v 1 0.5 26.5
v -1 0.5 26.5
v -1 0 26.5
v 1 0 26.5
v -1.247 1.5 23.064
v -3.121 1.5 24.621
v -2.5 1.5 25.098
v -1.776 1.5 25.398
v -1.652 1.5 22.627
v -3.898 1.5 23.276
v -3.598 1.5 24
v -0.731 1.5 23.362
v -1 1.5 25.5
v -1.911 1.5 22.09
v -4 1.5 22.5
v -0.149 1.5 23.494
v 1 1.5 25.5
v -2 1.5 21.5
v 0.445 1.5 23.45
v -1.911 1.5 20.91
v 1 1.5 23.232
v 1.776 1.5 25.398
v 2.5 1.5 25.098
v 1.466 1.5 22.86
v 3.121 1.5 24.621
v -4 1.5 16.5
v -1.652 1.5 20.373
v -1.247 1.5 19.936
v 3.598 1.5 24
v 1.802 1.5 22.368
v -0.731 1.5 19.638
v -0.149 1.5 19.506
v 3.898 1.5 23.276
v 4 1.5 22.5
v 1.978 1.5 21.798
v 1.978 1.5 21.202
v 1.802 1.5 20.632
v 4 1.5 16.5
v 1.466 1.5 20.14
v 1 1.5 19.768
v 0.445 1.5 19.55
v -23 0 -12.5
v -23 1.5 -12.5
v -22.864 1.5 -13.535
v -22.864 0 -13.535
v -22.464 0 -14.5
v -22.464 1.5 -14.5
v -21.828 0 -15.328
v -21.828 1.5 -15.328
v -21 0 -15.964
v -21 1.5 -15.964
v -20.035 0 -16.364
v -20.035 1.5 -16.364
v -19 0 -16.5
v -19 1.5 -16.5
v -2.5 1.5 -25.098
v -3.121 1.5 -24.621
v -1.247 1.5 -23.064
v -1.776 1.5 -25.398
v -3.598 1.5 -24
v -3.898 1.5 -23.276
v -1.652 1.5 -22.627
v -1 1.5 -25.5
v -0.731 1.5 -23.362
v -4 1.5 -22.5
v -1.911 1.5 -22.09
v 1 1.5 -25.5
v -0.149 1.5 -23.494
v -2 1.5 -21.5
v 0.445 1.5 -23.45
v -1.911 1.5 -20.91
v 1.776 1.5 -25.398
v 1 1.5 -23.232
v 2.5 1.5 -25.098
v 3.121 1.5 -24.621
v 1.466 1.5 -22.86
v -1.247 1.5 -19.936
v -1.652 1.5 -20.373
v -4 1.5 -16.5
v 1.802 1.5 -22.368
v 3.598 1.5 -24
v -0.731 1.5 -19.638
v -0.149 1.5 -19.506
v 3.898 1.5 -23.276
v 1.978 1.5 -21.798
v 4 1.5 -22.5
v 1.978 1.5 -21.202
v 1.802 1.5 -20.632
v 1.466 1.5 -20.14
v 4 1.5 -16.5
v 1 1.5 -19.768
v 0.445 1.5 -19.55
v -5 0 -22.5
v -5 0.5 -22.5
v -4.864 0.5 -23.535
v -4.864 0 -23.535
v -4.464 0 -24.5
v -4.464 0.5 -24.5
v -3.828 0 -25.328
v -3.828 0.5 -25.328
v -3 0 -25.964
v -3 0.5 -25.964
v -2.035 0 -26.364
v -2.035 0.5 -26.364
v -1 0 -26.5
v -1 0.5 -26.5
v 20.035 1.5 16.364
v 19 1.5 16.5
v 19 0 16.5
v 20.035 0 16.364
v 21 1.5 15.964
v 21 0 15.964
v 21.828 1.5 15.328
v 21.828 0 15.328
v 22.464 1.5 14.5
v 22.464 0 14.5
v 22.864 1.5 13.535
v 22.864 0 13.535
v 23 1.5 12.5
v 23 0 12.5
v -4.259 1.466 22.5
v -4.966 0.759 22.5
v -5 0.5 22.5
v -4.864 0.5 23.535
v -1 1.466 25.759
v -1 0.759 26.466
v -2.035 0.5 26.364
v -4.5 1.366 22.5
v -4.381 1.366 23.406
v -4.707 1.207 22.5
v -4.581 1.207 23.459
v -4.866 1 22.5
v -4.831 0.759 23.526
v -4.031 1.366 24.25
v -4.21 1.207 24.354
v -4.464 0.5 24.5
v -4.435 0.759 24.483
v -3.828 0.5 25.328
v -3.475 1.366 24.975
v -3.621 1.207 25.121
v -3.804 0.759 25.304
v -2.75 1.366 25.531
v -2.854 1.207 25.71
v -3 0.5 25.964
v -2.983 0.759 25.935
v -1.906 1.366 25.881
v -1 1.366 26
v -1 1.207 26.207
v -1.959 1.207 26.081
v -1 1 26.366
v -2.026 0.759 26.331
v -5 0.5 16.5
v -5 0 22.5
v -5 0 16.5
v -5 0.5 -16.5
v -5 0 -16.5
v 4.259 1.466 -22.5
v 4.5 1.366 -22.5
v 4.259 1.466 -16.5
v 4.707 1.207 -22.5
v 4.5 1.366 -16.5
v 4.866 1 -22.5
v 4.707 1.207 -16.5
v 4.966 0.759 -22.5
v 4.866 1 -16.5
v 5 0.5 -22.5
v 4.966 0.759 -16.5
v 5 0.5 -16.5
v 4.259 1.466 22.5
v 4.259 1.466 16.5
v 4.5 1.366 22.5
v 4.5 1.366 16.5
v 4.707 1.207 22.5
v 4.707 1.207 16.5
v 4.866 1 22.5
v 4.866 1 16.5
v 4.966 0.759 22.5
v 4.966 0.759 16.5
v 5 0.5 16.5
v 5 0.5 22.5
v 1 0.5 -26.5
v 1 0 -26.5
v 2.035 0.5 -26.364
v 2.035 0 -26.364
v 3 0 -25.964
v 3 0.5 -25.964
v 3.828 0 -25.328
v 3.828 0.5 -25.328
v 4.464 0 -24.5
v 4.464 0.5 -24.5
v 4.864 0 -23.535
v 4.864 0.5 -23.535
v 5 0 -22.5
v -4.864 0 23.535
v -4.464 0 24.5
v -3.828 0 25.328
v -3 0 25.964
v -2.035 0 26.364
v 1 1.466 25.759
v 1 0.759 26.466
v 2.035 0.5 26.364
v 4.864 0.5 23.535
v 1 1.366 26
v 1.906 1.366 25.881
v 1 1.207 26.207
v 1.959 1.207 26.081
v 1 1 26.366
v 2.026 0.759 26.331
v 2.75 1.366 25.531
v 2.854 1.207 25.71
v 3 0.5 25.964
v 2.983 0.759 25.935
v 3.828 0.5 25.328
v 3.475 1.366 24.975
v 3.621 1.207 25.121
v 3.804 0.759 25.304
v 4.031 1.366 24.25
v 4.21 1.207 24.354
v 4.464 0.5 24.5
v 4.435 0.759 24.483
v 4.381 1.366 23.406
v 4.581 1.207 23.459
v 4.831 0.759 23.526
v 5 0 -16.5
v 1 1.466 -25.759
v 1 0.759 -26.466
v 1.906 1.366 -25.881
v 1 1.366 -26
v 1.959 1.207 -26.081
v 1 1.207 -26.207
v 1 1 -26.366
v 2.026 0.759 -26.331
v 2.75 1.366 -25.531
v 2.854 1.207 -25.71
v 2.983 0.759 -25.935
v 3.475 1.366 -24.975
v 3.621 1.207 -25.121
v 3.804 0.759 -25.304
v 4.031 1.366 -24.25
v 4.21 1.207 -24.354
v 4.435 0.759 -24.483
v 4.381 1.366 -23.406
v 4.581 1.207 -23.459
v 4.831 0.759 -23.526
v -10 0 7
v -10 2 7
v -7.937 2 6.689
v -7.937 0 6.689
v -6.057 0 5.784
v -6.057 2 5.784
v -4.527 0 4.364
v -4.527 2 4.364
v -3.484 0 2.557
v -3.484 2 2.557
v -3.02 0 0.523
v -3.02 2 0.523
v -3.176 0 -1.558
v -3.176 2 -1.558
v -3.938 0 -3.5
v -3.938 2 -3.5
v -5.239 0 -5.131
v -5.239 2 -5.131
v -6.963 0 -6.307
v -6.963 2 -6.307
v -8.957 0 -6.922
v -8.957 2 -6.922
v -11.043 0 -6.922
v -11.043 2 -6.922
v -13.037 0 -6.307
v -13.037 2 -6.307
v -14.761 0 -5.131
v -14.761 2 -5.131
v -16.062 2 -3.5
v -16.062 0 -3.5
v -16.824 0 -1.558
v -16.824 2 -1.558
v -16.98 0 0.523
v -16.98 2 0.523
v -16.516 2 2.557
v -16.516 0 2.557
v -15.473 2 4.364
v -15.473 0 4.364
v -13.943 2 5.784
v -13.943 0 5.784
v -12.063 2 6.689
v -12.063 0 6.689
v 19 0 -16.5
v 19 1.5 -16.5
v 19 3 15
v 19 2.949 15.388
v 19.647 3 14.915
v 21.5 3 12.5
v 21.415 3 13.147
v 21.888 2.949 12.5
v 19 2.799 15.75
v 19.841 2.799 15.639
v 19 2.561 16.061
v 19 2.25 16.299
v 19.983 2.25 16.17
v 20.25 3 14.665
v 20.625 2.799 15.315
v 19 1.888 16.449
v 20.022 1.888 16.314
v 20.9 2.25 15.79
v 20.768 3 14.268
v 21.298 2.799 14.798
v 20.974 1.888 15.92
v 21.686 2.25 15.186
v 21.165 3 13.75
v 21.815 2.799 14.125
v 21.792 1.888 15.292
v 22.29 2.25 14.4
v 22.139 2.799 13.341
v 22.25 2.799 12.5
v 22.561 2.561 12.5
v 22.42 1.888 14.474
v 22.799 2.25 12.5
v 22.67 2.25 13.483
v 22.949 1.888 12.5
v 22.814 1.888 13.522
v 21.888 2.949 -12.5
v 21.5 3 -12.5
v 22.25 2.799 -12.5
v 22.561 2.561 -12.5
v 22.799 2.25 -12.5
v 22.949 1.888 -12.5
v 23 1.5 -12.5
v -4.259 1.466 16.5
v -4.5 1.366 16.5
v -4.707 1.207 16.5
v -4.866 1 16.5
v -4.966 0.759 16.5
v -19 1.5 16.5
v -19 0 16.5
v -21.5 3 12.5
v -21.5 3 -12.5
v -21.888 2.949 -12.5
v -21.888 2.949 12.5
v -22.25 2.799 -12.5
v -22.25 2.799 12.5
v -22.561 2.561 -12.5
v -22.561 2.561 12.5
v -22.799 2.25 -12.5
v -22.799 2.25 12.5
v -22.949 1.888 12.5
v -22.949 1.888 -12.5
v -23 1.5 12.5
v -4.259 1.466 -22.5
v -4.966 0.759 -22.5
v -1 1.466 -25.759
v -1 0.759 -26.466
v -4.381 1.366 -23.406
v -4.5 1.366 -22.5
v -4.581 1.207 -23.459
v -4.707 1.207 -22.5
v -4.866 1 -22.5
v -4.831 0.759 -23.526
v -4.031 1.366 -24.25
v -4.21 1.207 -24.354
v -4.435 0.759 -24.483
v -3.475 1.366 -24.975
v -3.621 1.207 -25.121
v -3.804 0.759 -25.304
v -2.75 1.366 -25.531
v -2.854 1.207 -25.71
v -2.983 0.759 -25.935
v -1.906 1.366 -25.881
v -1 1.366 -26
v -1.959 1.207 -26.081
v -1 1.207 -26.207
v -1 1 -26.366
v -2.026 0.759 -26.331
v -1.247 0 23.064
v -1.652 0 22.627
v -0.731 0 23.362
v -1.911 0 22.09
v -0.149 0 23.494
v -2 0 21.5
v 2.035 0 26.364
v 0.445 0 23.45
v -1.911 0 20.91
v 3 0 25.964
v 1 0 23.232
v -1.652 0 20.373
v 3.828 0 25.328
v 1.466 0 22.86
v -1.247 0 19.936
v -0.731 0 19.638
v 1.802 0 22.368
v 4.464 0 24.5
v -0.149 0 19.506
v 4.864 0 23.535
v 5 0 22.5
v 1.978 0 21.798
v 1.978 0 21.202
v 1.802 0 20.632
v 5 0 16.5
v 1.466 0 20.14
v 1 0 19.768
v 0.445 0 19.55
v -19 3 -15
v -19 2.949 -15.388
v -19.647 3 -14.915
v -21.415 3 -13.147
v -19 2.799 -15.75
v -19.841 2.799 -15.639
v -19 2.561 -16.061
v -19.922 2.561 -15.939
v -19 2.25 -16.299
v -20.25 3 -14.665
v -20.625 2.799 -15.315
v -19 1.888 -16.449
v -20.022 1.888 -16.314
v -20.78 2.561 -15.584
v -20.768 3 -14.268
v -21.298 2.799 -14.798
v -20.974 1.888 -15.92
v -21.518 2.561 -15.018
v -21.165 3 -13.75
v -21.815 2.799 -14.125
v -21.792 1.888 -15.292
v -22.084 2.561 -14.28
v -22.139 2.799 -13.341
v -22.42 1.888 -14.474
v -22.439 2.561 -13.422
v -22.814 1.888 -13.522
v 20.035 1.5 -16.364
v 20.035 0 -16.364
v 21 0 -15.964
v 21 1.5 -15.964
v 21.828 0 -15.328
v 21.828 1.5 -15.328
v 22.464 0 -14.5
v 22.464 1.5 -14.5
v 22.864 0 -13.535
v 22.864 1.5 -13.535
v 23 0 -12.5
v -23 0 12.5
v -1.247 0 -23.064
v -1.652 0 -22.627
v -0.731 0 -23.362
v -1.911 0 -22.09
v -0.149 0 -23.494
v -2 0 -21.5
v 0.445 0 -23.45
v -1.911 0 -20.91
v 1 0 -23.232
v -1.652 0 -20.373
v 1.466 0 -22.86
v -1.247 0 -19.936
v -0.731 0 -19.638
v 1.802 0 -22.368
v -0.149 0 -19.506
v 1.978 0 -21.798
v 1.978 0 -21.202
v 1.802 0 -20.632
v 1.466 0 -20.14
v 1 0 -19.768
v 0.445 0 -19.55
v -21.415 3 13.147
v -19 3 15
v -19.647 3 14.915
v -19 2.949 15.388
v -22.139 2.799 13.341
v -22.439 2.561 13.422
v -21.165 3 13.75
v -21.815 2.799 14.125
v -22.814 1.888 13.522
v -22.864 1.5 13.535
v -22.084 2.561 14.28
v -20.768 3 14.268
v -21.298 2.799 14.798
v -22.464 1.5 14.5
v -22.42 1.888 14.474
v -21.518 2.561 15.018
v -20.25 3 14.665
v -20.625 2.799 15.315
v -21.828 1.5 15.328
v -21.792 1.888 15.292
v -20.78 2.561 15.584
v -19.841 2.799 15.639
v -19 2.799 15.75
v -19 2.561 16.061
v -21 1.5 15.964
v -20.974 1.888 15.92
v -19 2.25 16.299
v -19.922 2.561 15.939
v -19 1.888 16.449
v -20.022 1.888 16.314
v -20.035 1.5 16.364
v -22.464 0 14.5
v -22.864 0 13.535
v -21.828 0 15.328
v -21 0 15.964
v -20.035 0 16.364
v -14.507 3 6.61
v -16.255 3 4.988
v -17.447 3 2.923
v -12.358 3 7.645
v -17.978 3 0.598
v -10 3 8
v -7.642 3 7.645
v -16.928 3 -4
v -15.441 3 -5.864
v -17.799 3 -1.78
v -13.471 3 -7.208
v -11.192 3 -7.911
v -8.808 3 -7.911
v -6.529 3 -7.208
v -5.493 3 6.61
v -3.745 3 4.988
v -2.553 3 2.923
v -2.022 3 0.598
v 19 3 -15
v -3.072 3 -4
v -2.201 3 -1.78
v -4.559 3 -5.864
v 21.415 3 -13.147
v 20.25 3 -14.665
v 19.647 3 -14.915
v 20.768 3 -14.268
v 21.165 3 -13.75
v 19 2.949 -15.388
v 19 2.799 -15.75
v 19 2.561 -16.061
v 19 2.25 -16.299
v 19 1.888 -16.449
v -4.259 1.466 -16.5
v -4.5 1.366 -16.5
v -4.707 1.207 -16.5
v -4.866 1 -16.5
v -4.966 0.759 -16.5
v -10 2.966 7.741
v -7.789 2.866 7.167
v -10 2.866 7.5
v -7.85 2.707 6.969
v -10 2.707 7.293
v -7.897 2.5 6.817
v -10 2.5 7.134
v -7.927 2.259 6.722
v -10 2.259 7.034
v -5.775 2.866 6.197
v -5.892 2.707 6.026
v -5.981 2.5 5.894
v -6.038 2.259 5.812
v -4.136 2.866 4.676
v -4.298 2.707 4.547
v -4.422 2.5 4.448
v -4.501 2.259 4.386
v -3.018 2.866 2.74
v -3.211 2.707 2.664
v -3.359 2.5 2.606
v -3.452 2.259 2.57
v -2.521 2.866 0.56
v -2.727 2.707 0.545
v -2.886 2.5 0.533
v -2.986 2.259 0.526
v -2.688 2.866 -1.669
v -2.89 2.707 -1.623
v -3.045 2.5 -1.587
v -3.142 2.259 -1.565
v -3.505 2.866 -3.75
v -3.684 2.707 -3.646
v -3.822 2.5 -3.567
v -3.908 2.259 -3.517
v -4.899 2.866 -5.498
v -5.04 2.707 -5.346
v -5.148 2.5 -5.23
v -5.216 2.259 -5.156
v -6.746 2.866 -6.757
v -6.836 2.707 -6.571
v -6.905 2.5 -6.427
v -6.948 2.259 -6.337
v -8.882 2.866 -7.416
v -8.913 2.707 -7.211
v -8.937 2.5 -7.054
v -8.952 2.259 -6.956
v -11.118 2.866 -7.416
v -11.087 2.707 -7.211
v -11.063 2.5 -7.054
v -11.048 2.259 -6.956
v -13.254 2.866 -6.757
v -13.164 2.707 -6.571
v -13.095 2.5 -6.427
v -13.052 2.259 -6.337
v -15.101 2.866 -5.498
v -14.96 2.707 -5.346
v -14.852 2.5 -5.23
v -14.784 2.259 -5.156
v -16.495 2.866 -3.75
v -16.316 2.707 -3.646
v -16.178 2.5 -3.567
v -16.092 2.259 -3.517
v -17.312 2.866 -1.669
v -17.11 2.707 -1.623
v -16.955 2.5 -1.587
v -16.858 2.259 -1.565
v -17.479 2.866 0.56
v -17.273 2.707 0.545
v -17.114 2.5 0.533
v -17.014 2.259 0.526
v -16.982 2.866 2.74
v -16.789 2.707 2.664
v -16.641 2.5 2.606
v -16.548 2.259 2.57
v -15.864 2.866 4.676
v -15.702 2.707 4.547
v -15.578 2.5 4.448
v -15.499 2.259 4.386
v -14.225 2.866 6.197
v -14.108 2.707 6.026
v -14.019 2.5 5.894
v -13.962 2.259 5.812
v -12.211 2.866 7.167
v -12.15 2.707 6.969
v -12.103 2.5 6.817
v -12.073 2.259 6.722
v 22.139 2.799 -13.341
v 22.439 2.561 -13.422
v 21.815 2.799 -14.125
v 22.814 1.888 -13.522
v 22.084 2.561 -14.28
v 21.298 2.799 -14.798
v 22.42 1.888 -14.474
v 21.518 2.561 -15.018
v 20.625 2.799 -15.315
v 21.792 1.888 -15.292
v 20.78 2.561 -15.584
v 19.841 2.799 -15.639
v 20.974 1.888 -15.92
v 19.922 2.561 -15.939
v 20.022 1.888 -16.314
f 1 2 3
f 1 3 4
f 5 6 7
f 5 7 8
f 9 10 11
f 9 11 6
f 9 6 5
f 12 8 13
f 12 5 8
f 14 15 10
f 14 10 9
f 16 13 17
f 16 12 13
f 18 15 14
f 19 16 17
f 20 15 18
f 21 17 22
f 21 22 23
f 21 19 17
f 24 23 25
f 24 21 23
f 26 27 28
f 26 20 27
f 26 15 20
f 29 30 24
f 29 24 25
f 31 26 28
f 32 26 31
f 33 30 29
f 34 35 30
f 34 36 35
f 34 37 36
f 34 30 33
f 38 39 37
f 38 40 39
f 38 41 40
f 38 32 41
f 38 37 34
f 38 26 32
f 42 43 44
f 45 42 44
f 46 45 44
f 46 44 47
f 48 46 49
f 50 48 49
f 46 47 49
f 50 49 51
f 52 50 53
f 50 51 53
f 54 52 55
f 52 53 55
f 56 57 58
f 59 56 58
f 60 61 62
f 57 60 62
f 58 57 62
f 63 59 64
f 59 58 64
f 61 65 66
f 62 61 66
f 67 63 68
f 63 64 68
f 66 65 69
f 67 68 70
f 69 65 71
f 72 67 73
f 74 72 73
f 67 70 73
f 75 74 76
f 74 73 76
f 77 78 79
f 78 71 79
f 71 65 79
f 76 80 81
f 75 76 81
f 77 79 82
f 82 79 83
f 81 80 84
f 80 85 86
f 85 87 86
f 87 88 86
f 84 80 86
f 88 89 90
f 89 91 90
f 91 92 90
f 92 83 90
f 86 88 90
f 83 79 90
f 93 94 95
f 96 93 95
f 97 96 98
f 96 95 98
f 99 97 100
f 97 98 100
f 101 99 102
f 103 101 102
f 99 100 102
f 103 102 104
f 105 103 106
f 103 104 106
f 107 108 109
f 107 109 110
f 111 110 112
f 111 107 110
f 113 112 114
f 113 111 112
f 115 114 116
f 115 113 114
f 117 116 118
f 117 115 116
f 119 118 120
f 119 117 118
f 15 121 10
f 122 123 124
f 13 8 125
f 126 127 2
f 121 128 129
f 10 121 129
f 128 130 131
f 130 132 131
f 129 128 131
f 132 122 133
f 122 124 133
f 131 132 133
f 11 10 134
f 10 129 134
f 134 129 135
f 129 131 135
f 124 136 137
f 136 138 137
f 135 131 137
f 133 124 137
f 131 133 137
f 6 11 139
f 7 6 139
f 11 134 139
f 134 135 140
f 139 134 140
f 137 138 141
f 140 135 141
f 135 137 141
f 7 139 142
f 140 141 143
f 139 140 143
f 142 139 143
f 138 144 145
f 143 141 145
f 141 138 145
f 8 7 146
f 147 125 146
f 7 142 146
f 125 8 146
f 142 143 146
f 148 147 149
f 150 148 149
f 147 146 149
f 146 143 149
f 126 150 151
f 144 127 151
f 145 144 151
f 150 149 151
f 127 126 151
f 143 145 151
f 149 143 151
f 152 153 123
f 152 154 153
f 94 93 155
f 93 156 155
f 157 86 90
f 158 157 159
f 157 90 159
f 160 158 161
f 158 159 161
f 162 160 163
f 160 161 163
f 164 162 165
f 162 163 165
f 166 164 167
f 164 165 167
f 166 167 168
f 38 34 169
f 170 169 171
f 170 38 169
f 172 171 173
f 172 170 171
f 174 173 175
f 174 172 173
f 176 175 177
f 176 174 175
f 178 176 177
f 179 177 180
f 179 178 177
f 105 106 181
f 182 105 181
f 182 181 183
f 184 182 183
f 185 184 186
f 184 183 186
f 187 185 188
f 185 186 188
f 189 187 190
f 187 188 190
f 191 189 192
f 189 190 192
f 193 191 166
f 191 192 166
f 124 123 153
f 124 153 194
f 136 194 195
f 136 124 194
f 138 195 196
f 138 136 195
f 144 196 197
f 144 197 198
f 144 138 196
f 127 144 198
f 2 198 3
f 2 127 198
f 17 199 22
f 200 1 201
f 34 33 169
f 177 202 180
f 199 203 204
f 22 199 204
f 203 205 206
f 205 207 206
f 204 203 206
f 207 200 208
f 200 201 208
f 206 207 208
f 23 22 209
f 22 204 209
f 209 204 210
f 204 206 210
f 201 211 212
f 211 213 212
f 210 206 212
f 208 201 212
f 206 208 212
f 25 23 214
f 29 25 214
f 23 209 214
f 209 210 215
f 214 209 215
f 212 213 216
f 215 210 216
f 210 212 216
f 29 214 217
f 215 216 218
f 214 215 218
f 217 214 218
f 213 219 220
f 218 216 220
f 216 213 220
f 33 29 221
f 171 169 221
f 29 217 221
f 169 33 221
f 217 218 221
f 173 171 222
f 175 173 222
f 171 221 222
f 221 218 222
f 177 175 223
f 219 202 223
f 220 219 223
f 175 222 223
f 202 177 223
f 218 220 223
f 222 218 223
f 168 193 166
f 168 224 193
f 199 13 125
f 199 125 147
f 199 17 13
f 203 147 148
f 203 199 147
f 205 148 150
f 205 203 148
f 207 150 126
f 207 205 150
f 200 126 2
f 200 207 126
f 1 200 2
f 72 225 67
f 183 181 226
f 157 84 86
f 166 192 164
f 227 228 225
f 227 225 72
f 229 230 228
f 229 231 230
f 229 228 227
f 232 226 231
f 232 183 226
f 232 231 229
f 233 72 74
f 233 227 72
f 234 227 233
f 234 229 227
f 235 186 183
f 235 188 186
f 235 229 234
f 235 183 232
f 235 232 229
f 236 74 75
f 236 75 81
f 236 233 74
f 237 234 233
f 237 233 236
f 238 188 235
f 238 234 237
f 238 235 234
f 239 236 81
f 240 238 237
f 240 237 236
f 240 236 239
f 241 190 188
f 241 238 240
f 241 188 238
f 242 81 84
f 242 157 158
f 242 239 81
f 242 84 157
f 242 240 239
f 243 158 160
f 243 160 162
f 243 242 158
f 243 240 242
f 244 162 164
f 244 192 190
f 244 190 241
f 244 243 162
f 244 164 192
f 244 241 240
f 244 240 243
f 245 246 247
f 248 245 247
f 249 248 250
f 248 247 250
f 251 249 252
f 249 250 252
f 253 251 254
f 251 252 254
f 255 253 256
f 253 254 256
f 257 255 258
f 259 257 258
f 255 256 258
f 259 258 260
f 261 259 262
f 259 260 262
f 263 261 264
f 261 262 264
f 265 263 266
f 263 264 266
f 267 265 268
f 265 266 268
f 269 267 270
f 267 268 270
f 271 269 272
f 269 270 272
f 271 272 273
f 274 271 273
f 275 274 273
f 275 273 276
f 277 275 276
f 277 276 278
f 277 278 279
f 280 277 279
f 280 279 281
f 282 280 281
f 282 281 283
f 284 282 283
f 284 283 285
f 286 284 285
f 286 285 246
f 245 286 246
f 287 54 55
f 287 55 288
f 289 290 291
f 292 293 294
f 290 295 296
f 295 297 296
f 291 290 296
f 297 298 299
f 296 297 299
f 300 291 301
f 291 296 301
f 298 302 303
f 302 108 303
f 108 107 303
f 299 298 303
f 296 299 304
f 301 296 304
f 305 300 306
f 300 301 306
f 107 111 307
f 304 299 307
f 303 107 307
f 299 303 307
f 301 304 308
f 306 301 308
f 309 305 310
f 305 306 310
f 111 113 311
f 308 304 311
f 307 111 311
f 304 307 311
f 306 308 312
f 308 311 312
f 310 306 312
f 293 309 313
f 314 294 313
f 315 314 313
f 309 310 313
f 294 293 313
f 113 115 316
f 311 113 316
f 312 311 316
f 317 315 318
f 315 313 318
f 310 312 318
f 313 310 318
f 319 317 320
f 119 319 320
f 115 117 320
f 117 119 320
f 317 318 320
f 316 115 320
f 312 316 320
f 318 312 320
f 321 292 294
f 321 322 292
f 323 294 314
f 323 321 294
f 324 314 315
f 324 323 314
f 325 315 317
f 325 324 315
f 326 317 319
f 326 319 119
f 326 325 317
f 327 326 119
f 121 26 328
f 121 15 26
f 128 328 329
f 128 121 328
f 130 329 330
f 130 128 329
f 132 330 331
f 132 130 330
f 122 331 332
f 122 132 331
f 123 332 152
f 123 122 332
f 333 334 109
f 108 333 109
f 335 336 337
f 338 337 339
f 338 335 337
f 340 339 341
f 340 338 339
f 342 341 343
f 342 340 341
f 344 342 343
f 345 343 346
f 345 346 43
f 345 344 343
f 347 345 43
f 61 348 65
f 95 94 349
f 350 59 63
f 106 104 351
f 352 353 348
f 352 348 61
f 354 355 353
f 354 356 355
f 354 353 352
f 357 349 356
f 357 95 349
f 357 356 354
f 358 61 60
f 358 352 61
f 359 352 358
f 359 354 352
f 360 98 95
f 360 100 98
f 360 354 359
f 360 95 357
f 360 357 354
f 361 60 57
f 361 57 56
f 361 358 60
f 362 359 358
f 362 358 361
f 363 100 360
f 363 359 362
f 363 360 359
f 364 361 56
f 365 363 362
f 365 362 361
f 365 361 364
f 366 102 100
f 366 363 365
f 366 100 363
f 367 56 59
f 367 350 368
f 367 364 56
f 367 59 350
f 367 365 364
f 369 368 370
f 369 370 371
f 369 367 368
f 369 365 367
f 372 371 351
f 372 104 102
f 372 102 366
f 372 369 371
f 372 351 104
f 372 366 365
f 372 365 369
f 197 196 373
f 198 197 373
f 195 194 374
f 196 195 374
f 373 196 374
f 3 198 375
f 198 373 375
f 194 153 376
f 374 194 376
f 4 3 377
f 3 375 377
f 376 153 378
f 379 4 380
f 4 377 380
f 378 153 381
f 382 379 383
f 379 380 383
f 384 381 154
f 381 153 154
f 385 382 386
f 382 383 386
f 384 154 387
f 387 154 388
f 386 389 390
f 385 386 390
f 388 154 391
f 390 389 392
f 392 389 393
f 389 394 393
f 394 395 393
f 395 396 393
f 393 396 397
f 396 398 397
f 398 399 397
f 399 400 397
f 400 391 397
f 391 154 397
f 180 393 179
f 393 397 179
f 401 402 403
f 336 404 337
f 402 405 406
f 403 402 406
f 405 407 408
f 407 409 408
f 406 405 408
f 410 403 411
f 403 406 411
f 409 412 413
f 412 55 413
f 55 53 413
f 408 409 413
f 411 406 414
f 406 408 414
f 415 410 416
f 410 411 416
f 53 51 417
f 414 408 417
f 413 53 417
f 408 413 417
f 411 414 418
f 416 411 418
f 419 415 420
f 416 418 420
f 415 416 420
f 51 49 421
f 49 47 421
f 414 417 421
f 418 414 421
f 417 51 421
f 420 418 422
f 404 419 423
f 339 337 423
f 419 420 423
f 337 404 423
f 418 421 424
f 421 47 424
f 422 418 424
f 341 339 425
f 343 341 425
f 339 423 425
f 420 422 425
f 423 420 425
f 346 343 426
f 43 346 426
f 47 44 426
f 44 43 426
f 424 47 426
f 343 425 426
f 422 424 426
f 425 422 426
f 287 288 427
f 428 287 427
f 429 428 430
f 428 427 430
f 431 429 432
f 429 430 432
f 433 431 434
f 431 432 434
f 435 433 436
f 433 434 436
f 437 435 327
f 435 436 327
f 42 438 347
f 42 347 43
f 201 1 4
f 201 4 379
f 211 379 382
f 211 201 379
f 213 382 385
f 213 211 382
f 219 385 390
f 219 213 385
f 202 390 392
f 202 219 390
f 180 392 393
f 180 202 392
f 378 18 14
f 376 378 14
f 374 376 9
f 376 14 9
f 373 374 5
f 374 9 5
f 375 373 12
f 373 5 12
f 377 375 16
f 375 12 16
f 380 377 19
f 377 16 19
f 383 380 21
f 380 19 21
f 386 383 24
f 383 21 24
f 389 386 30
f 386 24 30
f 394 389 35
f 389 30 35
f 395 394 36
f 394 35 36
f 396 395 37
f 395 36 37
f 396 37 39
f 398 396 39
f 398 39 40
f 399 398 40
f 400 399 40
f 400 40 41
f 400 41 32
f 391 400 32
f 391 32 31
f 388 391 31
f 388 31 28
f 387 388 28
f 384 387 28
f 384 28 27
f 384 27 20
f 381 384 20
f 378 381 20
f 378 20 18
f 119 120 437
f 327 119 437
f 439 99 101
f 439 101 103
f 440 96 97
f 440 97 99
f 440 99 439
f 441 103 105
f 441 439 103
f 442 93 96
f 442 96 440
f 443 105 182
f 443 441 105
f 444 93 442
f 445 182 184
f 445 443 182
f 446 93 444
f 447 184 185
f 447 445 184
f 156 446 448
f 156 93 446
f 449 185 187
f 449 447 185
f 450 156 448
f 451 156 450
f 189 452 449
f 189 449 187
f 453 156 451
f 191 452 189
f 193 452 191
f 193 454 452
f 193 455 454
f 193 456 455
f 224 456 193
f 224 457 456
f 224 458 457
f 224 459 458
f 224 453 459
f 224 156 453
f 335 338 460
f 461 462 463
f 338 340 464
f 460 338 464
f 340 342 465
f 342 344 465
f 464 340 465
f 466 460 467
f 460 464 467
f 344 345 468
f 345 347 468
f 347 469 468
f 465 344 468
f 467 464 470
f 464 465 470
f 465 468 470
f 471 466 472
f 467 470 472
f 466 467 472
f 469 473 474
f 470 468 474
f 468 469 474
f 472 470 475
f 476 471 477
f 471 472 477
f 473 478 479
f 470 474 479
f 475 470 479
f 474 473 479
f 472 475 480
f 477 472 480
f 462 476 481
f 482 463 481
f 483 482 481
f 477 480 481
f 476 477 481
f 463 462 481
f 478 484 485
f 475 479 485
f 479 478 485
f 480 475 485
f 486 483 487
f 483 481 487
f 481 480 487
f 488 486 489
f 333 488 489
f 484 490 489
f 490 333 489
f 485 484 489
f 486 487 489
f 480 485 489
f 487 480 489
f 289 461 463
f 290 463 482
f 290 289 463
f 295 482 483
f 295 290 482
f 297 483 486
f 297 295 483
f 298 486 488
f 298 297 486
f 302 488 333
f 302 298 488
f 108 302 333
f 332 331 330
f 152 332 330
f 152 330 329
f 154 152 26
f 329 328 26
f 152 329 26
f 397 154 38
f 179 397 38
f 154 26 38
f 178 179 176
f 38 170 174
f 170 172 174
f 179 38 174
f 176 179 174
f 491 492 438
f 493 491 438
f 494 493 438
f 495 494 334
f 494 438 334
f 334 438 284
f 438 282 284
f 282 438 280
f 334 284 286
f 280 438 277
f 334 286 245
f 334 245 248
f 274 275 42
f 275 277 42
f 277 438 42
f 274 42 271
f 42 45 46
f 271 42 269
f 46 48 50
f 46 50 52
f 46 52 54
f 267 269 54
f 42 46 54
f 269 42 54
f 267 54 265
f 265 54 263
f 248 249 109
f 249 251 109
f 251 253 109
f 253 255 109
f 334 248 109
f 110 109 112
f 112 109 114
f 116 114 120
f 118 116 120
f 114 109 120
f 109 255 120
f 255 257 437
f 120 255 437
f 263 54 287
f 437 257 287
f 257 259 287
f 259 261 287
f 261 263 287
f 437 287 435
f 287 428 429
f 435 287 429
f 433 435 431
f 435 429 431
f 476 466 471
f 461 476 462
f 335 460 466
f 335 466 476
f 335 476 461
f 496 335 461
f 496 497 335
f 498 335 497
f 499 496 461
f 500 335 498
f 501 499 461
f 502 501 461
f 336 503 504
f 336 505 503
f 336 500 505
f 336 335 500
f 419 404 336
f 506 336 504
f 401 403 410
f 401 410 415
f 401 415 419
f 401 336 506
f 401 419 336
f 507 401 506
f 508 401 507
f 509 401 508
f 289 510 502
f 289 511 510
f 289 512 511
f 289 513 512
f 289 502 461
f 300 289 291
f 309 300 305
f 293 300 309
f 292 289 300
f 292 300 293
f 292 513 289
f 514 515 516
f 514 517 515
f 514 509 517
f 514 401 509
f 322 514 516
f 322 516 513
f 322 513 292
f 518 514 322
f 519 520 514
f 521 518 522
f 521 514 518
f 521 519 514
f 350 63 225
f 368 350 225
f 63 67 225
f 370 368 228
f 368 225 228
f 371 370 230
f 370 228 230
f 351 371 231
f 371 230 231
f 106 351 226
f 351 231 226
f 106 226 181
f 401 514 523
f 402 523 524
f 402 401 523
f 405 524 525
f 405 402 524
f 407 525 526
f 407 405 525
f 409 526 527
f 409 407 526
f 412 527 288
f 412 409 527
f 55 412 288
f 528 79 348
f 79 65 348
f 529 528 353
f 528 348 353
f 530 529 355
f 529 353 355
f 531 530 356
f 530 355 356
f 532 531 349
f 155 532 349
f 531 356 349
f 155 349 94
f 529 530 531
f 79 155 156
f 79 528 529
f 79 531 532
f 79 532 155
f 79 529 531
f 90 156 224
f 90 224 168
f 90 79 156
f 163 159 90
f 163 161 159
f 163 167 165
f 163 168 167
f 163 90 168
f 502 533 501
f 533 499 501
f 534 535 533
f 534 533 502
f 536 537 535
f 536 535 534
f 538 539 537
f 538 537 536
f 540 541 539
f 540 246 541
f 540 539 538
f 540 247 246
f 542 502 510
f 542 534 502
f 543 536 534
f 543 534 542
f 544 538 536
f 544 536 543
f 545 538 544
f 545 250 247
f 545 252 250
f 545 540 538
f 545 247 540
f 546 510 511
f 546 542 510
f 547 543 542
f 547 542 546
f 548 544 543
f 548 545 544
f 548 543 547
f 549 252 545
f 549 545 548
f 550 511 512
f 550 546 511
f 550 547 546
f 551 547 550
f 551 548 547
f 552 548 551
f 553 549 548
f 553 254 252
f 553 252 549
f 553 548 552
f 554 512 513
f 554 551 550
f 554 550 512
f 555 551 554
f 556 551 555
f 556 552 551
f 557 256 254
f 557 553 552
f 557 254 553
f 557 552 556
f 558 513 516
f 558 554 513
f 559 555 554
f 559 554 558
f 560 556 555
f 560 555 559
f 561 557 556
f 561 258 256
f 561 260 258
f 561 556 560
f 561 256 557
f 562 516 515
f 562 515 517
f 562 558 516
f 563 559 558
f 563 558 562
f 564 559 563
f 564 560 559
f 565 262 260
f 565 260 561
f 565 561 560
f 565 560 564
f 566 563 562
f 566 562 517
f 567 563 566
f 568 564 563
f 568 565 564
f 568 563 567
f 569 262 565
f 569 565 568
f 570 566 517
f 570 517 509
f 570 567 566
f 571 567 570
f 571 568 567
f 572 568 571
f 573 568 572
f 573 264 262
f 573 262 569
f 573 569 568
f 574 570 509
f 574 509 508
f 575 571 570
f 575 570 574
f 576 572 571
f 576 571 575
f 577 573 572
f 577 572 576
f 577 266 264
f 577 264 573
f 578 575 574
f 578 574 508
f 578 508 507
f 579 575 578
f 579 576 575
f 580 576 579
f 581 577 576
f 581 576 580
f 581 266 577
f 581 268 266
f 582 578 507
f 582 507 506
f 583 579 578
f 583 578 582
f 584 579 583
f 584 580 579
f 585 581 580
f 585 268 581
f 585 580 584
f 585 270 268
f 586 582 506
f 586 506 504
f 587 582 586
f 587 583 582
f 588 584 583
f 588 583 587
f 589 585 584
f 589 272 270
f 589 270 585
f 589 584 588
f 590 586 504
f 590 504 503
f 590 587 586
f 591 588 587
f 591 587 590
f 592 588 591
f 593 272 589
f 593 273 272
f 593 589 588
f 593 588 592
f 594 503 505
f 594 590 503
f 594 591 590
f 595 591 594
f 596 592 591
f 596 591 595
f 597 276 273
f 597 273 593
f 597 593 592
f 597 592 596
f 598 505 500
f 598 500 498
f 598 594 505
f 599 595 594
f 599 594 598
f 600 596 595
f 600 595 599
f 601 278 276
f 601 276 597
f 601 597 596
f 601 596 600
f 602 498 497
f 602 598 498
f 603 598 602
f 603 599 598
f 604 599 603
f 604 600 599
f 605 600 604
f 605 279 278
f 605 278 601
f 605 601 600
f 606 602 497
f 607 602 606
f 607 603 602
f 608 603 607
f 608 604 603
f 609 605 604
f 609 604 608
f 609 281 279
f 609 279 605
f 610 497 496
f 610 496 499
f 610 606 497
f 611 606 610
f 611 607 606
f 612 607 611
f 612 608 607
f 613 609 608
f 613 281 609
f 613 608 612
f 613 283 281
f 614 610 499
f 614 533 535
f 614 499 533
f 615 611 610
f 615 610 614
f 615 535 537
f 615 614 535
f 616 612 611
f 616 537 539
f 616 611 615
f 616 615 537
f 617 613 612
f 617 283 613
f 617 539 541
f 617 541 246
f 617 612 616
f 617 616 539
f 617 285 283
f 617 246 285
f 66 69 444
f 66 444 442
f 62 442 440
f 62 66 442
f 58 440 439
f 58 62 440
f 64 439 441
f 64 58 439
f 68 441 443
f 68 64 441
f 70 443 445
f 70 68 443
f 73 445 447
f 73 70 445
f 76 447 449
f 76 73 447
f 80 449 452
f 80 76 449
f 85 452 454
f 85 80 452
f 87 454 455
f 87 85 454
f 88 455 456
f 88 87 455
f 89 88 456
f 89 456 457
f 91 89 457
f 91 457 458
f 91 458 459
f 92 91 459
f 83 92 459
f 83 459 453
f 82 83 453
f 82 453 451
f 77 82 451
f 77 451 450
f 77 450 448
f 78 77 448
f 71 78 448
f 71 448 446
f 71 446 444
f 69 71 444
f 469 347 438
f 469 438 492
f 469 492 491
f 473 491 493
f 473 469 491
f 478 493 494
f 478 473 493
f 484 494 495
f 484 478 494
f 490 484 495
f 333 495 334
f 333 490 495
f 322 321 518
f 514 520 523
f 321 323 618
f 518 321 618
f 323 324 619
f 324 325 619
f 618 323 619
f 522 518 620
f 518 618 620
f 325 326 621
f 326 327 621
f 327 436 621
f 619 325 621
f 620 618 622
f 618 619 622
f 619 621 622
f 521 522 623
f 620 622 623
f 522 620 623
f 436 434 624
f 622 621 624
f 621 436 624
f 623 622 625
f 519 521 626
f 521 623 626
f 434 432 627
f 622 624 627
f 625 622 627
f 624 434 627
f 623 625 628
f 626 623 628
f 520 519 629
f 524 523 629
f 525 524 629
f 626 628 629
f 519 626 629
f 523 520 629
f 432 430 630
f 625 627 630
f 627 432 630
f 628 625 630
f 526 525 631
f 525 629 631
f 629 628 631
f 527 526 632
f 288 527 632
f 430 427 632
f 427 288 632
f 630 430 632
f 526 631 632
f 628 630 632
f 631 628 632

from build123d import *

# Parameters (mm, degrees)
BASE_W             = 46
BASE_H             = 33
SHELL_DEPTH        = 3
SKETCH2_W          = 10
SKETCH2_H          = 1.5
LEG_DEPTH          = 10
SKETCH3_R          = 2
CUT_EXTRUDE1_DEPTH = 10
FILLET1_R          = 4
SKETCH4_R          = 7
CUT_EXTRUDE2_DEPTH = 10
FILLET2_R          = 1
FILLET3_R          = 4
FILLET10_R         = 1.5
FILLET11_R         = 1
FILLET12_R         = 1


with BuildPart() as part:
    # Base → Shell (new body)
    with BuildSketch(Plane(origin=(0, 0, 0), x_dir=(1, 0, 0), z_dir=(0, 1, 0))):
        Rectangle(BASE_W, BASE_H)
    extrude(amount=SHELL_DEPTH)

    # Sketch4 → Cut-Extrude2 (cut)
    with BuildSketch(Plane(origin=(0, 3, 0), x_dir=(1, 0, 0), z_dir=(0, 1, 0))):
        with Locations(Location((-10, 0, 0), (0, 0, 270))):
            Circle(SKETCH4_R)
    extrude(amount=-CUT_EXTRUDE2_DEPTH, mode=Mode.SUBTRACT)

    # Fillet2
    fillet2_edges = [part.edges().sort_by_distance(p)[0] for p in [
        (-10, 3, -7),
    ]]
    fillet(fillet2_edges, radius=FILLET2_R)

    # Fillet3
    fillet3_edges = [part.edges().sort_by_distance(p)[0] for p in [
        (23, 1.5, 16.5),
        (-23, 1.5, 16.5),
        (-23, 1.5, -16.5),
        (23, 1.5, -16.5),
    ]]
    fillet(fillet3_edges, radius=FILLET3_R)

    # Fillet10
    fillet10_edges = [part.edges().sort_by_distance(p)[0] for p in [
        (23, 3, 0),
        (0, 3, 16.5),
        (0, 3, -16.5),
        (-23, 3, 0),
        (-21.828427125, 3, 15.328427125),
        (-21.828427125, 3, -15.328427125),
        (21.828427125, 3, -15.328427125),
        (21.828427125, 3, 15.328427125),
    ]]
    fillet(fillet10_edges, radius=FILLET10_R)


with BuildPart() as body_2:
    # Sketch2 → Leg (new body)
    with BuildSketch(Plane.XY.offset(16.5)):
        with Locations((0, 0.75)):
            Rectangle(SKETCH2_W, SKETCH2_H)
    extrude(amount=LEG_DEPTH)

    # Sketch3 → Cut-Extrude1 (cut)
    with BuildSketch(Plane(origin=(0, 3, 0), x_dir=(1, 0, 0), z_dir=(0, 1, 0))):
        with Locations(Location((0, -21.5, 0), (0, 0, 180))):
            Circle(SKETCH3_R)
    extrude(amount=-CUT_EXTRUDE1_DEPTH, mode=Mode.SUBTRACT)

    # Fillet1
    fillet1_edges = [body_2.edges().sort_by_distance(p)[0] for p in [
        (-5, 0.75, 26.5),
        (5, 0.75, 26.5),
    ]]
    fillet(fillet1_edges, radius=FILLET1_R)


with BuildPart() as body_3:
    # Mirror3: mirrored copy
    add(body_2.part.mirror(Plane.XY))

    # Fillet12
    fillet12_edges = [body_3.edges().sort_by_distance(p)[0] for p in [
        (0, 1.5, -26.5),
        (-5, 1.5, -19.5),
        (5, 1.5, -19.5),
        (3.828427125, 1.5, -25.328427125),
        (-3.828427125, 1.5, -25.328427125),
    ]]
    fillet(fillet12_edges, radius=FILLET12_R)


with BuildPart() as body_2_1:
    add(body_2.part)

    # Fillet11
    fillet11_edges = [body_2_1.edges().sort_by_distance(p)[0] for p in [
        (0, 1.5, 26.5),
        (-5, 1.5, 19.5),
        (5, 1.5, 19.5),
        (3.828427125, 1.5, 25.328427125),
        (-3.828427125, 1.5, 25.328427125),
    ]]
    fillet(fillet11_edges, radius=FILLET11_R)


solid = Compound([part.part, body_3.part, body_2_1.part])
